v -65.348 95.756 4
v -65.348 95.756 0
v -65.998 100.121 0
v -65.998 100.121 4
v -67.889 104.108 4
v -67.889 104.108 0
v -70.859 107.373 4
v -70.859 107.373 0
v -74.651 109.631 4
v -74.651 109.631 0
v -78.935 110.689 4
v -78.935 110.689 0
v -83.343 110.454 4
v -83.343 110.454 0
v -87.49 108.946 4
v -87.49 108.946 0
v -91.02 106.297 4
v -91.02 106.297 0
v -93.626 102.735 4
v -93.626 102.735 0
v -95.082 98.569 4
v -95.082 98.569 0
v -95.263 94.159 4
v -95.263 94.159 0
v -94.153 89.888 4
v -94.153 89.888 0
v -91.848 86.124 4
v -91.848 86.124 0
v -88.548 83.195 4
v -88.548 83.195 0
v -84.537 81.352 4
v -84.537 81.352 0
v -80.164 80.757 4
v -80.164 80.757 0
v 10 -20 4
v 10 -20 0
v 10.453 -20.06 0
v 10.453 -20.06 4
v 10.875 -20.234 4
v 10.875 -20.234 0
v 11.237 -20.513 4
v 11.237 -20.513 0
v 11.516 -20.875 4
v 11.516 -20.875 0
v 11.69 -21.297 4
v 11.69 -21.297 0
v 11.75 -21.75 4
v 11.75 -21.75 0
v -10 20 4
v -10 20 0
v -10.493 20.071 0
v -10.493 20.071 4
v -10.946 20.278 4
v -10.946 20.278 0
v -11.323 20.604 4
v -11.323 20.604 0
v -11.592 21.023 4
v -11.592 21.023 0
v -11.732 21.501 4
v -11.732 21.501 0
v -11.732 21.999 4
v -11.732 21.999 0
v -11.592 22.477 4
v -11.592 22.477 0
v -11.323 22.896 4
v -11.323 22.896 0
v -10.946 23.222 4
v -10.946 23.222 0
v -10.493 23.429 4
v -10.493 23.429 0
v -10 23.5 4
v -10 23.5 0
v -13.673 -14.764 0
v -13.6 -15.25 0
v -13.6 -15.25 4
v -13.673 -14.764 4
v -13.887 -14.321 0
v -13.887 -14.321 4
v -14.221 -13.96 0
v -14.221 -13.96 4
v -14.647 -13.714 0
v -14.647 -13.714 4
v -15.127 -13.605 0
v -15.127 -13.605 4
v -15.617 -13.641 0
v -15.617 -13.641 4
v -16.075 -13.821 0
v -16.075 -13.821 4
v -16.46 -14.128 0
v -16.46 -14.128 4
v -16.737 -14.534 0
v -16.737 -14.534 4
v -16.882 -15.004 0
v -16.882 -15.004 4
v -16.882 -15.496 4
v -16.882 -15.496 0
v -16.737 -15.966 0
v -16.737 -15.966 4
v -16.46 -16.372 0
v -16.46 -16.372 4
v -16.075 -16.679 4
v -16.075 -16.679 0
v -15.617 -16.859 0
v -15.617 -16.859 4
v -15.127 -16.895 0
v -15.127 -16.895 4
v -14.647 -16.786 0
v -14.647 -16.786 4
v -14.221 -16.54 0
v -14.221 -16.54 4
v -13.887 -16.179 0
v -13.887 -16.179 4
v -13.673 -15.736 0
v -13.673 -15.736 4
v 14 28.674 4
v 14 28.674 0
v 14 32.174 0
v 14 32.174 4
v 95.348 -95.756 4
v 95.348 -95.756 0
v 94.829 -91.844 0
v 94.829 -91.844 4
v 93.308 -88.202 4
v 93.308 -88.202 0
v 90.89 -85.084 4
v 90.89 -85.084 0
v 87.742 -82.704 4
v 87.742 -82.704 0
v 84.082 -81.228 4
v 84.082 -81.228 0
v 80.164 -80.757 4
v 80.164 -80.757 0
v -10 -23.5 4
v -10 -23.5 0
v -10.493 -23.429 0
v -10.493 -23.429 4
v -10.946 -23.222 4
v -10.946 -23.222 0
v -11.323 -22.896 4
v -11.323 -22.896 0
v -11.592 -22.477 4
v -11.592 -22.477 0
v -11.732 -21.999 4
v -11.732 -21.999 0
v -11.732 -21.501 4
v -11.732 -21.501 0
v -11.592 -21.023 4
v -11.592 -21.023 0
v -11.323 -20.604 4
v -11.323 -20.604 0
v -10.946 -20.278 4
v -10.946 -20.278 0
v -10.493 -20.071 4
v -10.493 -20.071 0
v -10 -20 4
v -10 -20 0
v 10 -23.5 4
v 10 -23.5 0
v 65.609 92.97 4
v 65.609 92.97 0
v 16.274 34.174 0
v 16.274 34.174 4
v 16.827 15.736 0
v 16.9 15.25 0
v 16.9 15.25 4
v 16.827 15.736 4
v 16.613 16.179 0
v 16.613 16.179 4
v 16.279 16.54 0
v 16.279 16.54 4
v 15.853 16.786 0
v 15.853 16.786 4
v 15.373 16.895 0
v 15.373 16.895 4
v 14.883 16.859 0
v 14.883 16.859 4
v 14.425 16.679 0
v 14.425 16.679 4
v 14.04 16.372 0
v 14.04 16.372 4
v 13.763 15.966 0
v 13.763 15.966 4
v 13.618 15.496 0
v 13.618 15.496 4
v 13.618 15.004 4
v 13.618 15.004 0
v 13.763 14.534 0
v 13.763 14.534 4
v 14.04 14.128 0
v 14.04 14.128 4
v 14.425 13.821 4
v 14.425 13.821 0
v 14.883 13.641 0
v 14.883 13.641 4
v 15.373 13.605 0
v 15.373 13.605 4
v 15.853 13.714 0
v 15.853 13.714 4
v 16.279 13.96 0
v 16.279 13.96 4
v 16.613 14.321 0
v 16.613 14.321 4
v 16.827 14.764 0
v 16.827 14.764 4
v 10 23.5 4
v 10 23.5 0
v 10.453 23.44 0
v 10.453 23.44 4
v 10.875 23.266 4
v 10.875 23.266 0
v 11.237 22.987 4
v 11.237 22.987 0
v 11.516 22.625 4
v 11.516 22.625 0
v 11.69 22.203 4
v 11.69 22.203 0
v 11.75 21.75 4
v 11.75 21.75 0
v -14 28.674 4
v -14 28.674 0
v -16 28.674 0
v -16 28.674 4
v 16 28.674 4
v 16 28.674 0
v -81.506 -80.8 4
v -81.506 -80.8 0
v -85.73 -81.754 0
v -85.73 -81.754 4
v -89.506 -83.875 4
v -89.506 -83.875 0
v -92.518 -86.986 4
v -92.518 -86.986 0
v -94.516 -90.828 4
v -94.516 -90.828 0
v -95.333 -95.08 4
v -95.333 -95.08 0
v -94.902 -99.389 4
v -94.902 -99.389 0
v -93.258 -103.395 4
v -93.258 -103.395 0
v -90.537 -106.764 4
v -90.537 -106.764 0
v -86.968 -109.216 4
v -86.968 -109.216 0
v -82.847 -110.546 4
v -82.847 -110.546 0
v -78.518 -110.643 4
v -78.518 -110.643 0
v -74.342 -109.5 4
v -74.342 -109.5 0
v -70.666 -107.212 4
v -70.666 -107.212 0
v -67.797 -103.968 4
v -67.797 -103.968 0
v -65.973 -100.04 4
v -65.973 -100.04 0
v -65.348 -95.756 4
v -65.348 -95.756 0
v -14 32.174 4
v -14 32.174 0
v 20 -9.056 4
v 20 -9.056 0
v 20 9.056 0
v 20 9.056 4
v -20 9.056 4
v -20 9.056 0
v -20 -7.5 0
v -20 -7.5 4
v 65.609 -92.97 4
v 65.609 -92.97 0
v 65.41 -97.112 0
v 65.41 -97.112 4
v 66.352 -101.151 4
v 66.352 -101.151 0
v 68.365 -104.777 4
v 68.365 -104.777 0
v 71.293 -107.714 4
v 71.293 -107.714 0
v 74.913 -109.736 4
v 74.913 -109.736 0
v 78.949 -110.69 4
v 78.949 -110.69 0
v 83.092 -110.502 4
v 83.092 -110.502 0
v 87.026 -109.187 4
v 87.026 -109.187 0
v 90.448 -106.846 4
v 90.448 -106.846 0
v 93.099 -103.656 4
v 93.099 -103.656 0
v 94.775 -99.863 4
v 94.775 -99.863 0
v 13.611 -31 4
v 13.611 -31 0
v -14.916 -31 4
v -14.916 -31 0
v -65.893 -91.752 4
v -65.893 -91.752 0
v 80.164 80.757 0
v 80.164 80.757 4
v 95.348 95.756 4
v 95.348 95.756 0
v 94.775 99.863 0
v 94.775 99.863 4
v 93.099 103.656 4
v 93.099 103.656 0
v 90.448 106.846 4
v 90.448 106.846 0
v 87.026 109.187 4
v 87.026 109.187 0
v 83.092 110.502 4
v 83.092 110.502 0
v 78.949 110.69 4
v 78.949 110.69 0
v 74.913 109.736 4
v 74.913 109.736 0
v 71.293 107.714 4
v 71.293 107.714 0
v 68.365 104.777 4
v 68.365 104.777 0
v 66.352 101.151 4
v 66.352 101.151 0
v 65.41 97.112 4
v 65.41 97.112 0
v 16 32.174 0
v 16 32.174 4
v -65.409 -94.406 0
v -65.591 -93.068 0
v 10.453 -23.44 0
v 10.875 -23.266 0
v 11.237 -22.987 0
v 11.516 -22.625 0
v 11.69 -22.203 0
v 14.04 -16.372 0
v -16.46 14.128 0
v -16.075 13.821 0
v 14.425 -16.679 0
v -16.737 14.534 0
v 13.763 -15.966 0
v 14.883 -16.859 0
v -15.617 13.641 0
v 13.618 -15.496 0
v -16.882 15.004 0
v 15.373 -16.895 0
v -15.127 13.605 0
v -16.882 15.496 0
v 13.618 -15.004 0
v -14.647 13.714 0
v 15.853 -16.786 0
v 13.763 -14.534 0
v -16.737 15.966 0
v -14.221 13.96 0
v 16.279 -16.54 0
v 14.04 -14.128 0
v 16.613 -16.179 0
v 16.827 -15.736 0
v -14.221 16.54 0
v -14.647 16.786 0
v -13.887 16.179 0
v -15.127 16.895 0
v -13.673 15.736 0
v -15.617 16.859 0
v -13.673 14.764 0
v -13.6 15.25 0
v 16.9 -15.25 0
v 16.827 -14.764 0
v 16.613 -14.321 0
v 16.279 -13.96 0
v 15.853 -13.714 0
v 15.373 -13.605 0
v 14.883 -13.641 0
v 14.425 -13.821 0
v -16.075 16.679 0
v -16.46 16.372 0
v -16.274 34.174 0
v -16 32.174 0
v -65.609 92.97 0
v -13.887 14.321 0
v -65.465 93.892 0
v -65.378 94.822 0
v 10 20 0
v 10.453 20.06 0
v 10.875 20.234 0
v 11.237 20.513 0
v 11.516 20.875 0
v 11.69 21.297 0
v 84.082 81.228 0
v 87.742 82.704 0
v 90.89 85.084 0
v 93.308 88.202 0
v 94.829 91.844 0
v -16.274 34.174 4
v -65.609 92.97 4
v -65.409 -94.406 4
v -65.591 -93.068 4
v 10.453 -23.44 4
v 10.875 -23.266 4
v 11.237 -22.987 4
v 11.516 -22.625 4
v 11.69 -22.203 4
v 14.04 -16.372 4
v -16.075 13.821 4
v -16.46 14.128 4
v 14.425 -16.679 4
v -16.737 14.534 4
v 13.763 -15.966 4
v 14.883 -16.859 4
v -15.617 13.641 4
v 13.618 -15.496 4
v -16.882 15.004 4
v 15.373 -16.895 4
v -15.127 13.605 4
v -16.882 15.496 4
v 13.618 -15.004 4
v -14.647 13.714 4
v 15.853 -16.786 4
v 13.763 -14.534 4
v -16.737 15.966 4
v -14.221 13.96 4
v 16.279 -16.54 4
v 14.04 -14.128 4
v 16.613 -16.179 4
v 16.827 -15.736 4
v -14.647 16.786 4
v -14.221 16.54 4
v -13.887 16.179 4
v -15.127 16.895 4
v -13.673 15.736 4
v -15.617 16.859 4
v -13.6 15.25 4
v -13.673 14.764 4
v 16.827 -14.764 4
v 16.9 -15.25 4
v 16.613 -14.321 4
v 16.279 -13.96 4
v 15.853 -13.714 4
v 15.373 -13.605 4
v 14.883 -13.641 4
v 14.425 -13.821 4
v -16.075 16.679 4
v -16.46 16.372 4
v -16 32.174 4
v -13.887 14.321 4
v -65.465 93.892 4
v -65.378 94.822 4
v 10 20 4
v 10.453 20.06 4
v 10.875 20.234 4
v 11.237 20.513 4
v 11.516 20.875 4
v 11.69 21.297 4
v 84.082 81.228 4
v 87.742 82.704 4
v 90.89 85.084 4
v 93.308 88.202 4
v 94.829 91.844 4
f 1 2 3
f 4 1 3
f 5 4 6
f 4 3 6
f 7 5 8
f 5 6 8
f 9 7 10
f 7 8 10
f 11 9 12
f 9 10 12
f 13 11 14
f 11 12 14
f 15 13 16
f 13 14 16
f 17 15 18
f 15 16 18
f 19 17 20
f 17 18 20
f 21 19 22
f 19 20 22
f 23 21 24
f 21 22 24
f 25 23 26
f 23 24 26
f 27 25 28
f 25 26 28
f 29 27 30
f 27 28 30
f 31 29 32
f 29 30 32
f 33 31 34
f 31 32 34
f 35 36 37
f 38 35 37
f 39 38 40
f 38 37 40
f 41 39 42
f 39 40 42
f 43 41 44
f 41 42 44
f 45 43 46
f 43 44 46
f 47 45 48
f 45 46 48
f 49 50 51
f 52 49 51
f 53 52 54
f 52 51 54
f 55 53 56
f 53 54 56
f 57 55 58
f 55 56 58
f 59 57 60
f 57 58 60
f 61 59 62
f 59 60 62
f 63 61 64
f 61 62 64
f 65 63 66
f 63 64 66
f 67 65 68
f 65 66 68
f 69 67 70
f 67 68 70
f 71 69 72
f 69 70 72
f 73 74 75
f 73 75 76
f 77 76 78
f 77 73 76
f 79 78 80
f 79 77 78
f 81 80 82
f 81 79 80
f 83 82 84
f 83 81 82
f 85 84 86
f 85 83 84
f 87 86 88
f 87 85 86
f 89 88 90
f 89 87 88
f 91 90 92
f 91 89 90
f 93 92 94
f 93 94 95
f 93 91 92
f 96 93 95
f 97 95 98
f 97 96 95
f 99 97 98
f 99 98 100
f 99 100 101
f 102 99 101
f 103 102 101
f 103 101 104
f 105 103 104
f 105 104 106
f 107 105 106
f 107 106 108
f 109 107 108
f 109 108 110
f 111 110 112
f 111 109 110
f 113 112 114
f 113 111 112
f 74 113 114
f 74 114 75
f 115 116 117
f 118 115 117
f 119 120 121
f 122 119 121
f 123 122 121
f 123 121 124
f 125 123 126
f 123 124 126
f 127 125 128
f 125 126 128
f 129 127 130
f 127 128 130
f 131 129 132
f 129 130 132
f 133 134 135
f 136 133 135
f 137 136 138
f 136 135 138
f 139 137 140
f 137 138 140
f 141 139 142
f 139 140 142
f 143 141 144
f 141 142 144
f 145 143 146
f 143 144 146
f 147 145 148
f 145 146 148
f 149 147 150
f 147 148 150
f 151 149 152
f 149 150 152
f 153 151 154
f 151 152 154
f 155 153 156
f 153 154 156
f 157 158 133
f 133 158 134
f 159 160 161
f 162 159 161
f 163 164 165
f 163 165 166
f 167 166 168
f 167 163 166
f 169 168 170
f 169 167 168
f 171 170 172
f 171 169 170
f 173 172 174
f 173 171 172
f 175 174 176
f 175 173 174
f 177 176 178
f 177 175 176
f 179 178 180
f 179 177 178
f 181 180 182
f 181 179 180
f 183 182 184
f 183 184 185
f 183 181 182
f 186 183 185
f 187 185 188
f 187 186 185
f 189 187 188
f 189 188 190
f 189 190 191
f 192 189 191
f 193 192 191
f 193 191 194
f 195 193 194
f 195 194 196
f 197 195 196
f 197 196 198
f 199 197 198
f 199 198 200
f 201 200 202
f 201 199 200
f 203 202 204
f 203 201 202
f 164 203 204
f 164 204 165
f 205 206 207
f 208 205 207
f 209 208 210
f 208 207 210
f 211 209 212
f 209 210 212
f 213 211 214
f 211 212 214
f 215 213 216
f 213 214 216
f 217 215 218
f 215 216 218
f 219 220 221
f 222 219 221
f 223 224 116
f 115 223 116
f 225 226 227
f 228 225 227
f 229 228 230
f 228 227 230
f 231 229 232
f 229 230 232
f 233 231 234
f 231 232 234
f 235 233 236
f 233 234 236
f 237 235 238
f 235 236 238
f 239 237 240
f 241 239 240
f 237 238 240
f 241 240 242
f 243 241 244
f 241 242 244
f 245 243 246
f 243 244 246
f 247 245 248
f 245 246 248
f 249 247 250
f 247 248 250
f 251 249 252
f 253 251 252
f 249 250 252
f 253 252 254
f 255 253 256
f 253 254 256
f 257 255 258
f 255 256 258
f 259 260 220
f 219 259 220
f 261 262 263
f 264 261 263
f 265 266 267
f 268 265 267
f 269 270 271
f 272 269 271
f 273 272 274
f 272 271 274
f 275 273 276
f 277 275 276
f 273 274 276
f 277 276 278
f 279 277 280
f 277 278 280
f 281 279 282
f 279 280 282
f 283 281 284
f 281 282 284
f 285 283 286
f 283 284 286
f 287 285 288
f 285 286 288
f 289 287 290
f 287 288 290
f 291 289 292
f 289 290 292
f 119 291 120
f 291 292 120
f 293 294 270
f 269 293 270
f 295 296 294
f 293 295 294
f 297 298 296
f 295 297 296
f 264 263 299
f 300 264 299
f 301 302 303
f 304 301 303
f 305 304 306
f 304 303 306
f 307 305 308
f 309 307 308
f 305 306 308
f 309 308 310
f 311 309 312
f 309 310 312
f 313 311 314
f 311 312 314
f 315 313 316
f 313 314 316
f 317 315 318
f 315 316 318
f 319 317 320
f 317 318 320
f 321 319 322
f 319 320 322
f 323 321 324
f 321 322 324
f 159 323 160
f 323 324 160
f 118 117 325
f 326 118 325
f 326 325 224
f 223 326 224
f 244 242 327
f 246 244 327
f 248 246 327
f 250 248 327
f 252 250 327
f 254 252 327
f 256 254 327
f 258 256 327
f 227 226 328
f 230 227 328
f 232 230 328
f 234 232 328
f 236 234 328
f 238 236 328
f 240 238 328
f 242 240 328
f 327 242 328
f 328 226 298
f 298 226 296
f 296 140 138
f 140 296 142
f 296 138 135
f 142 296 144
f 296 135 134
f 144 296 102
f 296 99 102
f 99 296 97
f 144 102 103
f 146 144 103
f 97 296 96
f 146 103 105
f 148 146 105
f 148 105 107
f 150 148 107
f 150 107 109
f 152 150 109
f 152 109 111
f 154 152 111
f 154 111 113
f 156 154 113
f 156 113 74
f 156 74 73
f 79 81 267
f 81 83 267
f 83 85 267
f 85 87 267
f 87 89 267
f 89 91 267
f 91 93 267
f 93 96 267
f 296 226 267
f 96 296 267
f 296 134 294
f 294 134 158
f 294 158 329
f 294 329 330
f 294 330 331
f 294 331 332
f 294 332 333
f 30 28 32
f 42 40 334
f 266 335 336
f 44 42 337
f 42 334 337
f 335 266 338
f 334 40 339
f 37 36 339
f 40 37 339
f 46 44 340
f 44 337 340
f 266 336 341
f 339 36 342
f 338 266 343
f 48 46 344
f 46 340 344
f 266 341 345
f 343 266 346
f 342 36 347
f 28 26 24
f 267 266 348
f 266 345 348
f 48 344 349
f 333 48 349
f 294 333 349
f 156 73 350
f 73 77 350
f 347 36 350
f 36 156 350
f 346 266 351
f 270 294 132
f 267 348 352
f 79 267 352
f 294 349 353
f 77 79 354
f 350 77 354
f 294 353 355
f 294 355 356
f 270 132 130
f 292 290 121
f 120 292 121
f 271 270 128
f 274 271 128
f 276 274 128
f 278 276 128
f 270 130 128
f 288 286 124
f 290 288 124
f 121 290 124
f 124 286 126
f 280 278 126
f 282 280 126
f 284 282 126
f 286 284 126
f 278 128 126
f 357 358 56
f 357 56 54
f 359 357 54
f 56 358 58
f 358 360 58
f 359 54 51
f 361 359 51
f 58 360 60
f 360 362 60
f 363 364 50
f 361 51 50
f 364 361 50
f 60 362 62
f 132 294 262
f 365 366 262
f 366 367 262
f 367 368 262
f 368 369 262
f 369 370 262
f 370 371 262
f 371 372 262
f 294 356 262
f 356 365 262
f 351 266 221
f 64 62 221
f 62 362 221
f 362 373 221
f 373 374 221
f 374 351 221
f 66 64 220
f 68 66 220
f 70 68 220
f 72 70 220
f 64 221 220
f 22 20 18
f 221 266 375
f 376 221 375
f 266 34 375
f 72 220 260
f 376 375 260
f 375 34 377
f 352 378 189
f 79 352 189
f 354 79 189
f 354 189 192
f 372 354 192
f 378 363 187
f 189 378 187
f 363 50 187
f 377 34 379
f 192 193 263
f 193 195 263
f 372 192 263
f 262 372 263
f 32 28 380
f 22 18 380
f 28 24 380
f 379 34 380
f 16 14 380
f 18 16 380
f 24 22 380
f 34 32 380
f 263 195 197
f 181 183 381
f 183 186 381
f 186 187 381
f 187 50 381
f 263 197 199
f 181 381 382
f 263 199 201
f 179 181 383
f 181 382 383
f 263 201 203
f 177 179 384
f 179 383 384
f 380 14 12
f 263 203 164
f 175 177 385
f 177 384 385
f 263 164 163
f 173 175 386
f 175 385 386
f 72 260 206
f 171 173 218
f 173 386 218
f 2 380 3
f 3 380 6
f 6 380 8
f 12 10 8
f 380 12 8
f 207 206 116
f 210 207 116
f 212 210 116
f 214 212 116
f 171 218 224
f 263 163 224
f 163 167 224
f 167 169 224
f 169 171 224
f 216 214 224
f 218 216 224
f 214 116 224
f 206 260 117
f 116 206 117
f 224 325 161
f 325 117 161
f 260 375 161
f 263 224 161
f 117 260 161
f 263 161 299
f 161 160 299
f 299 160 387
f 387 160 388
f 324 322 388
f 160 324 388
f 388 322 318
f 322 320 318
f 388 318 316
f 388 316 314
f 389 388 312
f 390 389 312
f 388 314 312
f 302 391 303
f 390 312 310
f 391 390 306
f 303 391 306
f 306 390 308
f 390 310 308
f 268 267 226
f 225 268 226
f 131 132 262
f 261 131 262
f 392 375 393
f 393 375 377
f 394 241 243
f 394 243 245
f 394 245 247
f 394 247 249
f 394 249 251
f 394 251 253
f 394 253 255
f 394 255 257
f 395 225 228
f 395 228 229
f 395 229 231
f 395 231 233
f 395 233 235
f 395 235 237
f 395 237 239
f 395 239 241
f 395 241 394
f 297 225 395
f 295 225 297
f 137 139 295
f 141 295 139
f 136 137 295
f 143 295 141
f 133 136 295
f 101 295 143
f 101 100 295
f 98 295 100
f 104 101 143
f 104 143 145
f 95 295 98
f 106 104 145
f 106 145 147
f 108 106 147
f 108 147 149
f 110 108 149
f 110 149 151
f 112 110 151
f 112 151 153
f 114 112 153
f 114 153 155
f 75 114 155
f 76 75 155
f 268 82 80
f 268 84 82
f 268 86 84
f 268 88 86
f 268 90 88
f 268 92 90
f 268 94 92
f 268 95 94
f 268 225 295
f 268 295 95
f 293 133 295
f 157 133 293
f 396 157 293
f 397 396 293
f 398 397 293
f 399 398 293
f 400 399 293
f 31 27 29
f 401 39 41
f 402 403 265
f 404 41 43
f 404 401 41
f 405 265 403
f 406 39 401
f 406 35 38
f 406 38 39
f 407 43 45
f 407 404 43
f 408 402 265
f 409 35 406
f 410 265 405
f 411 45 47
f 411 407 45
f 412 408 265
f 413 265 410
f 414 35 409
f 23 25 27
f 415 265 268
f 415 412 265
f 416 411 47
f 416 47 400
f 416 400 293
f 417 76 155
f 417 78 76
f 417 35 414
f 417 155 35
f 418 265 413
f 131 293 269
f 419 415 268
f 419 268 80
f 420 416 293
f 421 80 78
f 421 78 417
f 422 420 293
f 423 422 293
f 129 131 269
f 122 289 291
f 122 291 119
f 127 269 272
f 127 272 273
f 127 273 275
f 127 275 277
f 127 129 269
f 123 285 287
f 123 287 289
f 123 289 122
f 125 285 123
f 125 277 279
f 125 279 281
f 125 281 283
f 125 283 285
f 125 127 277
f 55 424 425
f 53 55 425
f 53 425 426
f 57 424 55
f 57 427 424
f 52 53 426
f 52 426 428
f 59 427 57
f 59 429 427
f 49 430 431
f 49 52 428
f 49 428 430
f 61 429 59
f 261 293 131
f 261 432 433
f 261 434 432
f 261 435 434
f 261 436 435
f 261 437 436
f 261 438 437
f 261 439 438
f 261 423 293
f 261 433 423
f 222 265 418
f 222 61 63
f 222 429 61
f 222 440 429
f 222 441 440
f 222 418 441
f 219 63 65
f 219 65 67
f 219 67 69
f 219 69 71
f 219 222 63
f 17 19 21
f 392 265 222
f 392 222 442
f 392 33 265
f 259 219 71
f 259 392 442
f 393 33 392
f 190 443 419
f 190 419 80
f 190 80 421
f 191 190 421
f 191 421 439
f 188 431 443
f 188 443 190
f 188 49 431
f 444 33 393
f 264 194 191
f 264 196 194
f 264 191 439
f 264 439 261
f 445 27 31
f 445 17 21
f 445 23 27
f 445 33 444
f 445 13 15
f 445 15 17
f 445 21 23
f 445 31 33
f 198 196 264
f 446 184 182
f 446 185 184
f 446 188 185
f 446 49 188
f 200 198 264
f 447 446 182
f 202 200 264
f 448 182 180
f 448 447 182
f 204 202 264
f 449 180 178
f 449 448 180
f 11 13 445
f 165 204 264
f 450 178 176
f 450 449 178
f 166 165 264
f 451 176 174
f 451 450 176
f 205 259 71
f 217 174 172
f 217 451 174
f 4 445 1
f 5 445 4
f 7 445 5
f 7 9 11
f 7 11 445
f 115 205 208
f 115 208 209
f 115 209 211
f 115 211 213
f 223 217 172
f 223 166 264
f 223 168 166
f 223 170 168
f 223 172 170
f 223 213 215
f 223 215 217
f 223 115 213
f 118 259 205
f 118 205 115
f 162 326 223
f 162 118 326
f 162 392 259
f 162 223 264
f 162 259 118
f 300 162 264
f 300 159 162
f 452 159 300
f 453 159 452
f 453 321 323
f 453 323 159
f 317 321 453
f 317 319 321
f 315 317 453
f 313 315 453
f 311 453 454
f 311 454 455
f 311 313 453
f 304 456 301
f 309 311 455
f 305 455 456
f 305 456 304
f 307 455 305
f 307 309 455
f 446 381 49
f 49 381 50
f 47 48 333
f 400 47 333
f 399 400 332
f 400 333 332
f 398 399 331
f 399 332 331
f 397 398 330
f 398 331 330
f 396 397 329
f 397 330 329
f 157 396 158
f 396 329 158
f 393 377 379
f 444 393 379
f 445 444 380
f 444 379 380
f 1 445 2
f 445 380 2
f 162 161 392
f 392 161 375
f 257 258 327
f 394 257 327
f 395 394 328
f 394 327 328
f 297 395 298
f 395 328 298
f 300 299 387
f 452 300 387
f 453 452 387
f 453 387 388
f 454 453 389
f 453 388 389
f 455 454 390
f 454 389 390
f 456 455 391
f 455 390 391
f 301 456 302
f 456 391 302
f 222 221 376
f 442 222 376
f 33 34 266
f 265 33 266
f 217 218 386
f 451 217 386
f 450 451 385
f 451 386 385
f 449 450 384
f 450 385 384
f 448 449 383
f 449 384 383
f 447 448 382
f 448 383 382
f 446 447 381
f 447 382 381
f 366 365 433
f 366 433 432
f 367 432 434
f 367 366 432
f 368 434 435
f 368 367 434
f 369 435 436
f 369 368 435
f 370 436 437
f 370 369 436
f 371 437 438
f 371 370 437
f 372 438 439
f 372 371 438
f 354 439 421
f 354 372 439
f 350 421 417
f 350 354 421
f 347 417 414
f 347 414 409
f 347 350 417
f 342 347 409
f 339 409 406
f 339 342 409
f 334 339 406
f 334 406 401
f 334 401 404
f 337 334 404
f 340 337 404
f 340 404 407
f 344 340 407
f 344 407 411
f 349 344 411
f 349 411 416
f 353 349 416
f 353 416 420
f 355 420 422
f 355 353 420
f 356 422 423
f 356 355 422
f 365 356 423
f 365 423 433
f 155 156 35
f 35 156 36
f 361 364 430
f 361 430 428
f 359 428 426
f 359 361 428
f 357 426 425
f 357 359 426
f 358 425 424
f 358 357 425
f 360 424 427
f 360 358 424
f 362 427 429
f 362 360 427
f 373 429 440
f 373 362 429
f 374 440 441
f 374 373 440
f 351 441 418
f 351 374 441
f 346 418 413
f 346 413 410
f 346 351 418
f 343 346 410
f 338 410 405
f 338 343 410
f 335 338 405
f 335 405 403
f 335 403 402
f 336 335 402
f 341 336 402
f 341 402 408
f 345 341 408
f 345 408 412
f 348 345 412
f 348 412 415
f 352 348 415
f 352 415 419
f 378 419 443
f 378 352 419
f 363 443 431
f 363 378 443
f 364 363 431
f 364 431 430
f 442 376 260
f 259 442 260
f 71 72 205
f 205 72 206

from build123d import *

# Parameters (mm, degrees)
F0_R     = 1.65
F1_DEPTH = 4


with BuildPart() as f1:
    # F0 (on Top) → F1 (new body)
    with BuildSketch(Plane.XY):
        with BuildLine():
            Line((-20, 34.1743044555), (-20, 20))
            Line((-20, 20), (-20, 9.0556954967))
            Line((-20, 9.0556954967), (-20, -7.4999716698))
            Line((-20, -7.4999716698), (-20, -20))
            Line((-20, -20), (-20, -31))
            Line((-20, -31), (-14.9161266072, -31))
            Line((-14.9161266072, -31), (-8.6228793733, -23.5))
            Line((-8.6228793733, -23.5), (-10, -23.5))
            ThreePointArc((-10, -23.5), (-11.75, -21.75), (-10, -20))
            Line((-10, -20), (-5.6860306642, -20))
            Line((-5.6860306642, -20), (4.3806233749, -20))
            Line((4.3806233749, -20), (10, -20))
            ThreePointArc((10, -20), (11.2374368671, -20.5125631329), (11.75, -21.75))
            ThreePointArc((11.75, -21.75), (11.2374368671, -22.9874368671), (10, -23.5))
            Line((10, -23.5), (7.317472084, -23.5))
            Line((7.317472084, -23.5), (13.6107193178, -31))
            Line((13.6107193178, -31), (20, -31))
            Line((20, -31), (20, -20))
            Line((20, -20), (20, -9.0556954967))
            Line((20, -9.0556954967), (20, 9.0556954967))
            Line((20, 9.0556954967), (20, 20))
            Line((20, 20), (20, 34.1743044555))
            Line((20, 34.1743044555), (16.2742770157, 34.1743044555))
            Line((16.2742770157, 34.1743044555), (14.5960777534, 32.1743044555))
            Line((14.5960777534, 32.1743044555), (16, 32.1743044555))
            Line((16, 32.1743044555), (16, 28.6743044555))
            Line((16, 28.6743044555), (14, 28.6743044555))
            Line((14, 28.6743044555), (14, 31.4639266515))
            Line((14, 31.4639266515), (7.317472084, 23.5))
            Line((7.317472084, 23.5), (10, 23.5))
            ThreePointArc((10, 23.5), (11.2374368671, 22.9874368671), (11.75, 21.75))
            ThreePointArc((11.75, 21.75), (11.2374368671, 20.5125631329), (10, 20))
            Line((10, 20), (0, 20))
            Line((0, 20), (-4.3806233749, 20))
            Line((-4.3806233749, 20), (-10, 20))
            ThreePointArc((-10, 20), (-11.75, 21.75), (-10, 23.5))
            Line((-10, 23.5), (-7.317472084, 23.5))
            Line((-7.317472084, 23.5), (-14, 31.4639266515))
            Line((-14, 31.4639266515), (-14, 28.6743044555))
            Line((-14, 28.6743044555), (-16, 28.6743044555))
            Line((-16, 28.6743044555), (-16, 32.1743044555))
            Line((-16, 32.1743044555), (-14.5960777534, 32.1743044555))
            Line((-14.5960777534, 32.1743044555), (-16.2742770157, 34.1743044555))
            Line((-16.2742770157, 34.1743044555), (-20, 34.1743044555))
        make_face()
        with Locations((-15.25, -15.25)):
            Circle(F0_R, mode=Mode.SUBTRACT)
        with Locations((15.25, -15.25)):
            Circle(F0_R, mode=Mode.SUBTRACT)
        with Locations((-15.25, 15.25)):
            Circle(F0_R, mode=Mode.SUBTRACT)
        with Locations((15.25, 15.25)):
            Circle(F0_R, mode=Mode.SUBTRACT)
        with BuildLine():
            Line((-20, 9.0556954967), (-20, 20))
            Line((-20, 20), (-20, 34.1743044555))
            Line((-20, 34.1743044555), (-16.2742770157, 34.1743044555))
            Line((-16.2742770157, 34.1743044555), (-65.6094303769, 92.9696507149))
            ThreePointArc((-65.6094303769, 92.9696507149), (-70.7066370655, 84.2648887431), (-80.1642747962, 80.7566861309))
            Line((-80.1642747962, 80.7566861309), (-20, 9.0556954967))
        make_face()
        with BuildLine():
            Line((-20, -20), (-20, -7.4999716698))
            Line((-20, -7.4999716698), (-81.5062852996, -80.8003081427))
            ThreePointArc((-81.5062852996, -80.8003081427), (-71.7350386168, -83.4751187737), (-65.8927282585, -91.7515481563))
            Line((-65.8927282585, -91.7515481563), (-14.9161266072, -31))
            Line((-14.9161266072, -31), (-20, -31))
            Line((-20, -31), (-20, -20))
        make_face()
        with BuildLine():
            ThreePointArc((-65.3484512108, 95.7555553899), (-91.0199704611, 106.2968397941), (-80.1642747962, 80.7566861309))
            Line((-80.1642747962, 80.7566861309), (-87.6258734204, 89.6490730979))
            Line((-87.6258734204, 89.6490730979), (-80.3484512108, 95.7555553899))
            Line((-80.3484512108, 95.7555553899), (-73.0710290012, 101.8620376819))
            Line((-73.0710290012, 101.8620376819), (-65.6094303769, 92.9696507149))
            ThreePointArc((-65.6094303769, 92.9696507149), (-65.413838519, 94.3565043737), (-65.3484512108, 95.7555553899))
        make_face()
        with BuildLine():
            Line((-87.6258734204, 89.6490730979), (-80.1642747962, 80.7566861309))
            ThreePointArc((-80.1642747962, 80.7566861309), (-70.7066370655, 84.2648887431), (-65.6094303769, 92.9696507149))
            Line((-65.6094303769, 92.9696507149), (-73.0710290012, 101.8620376819))
            Line((-73.0710290012, 101.8620376819), (-80.3484512108, 95.7555553899))
            Line((-80.3484512108, 95.7555553899), (-87.6258734204, 89.6490730979))
        make_face()
        Polygon((16.2742770157, 34.1743044555), (-16.2742770157, 34.1743044555), (-14.5960777534, 32.1743044555), (-14, 32.1743044555), (-14, 31.4639266515), (-7.317472084, 23.5), (7.317472084, 23.5), (14, 31.4639266515), (14, 32.1743044555), (14.5960777534, 32.1743044555), align=None)
        with BuildLine():
            ThreePointArc((-65.8927282585, -91.7515481563), (-71.7350386168, -83.4751187737), (-81.5062852996, -80.8003081427))
            Line((-81.5062852996, -80.8003081427), (-88.3919178636, -89.0062854882))
            Line((-88.3919178636, -89.0062854882), (-80.3484512108, -95.7555553899))
            Line((-80.3484512108, -95.7555553899), (-73.8370734443, -101.2192500722))
            Line((-73.8370734443, -101.2192500722), (-65.8927282585, -91.7515481563))
        make_face()
        with BuildLine():
            Line((-88.3919178636, -89.0062854882), (-81.5062852996, -80.8003081427))
            ThreePointArc((-81.5062852996, -80.8003081427), (-90.5374768921, -106.7639047514), (-65.3484512108, -95.7555553899))
            ThreePointArc((-65.3484512108, -95.7555553899), (-65.485143297, -93.7351401212), (-65.8927282585, -91.7515481563))
            Line((-65.8927282585, -91.7515481563), (-73.8370734443, -101.2192500722))
            Line((-73.8370734443, -101.2192500722), (-80.3484512108, -95.7555553899))
            Line((-80.3484512108, -95.7555553899), (-88.3919178636, -89.0062854882))
        make_face()
        with BuildLine():
            Line((65.6094303769, 92.9696507149), (16.2742770157, 34.1743044555))
            Line((16.2742770157, 34.1743044555), (20, 34.1743044555))
            Line((20, 34.1743044555), (20, 20))
            Line((20, 20), (20, 9.0556954967))
            Line((20, 9.0556954967), (80.1642747962, 80.7566861309))
            ThreePointArc((80.1642747962, 80.7566861309), (70.7066370655, 84.2648887431), (65.6094303769, 92.9696507149))
        make_face()
        with BuildLine():
            ThreePointArc((95.3484512108, 95.7555553899), (78.9494001947, 110.6901680817), (65.6094303769, 92.9696507149))
            Line((65.6094303769, 92.9696507149), (73.0710290012, 101.8620376819))
            Line((73.0710290012, 101.8620376819), (80.3484512108, 95.7555553899))
            Line((80.3484512108, 95.7555553899), (87.6258734204, 89.6490730979))
            Line((87.6258734204, 89.6490730979), (80.1642747962, 80.7566861309))
            ThreePointArc((80.1642747962, 80.7566861309), (90.889735615, 85.0840361396), (95.3484512108, 95.7555553899))
        make_face()
        with BuildLine():
            Line((73.0710290012, 101.8620376819), (65.6094303769, 92.9696507149))
            ThreePointArc((65.6094303769, 92.9696507149), (70.7066370655, 84.2648887431), (80.1642747962, 80.7566861309))
            Line((80.1642747962, 80.7566861309), (87.6258734204, 89.6490730979))
            Line((87.6258734204, 89.6490730979), (80.3484512108, 95.7555553899))
            Line((80.3484512108, 95.7555553899), (73.0710290012, 101.8620376819))
        make_face()
        Polygon((-8.6228793733, -23.5), (-14.9161266072, -31), (13.6107193178, -31), (7.317472084, -23.5), align=None)
        with BuildLine():
            Line((20, -31), (13.6107193178, -31))
            Line((13.6107193178, -31), (65.6094303769, -92.9696507149))
            ThreePointArc((65.6094303769, -92.9696507149), (70.7066370655, -84.2648887431), (80.1642747962, -80.7566861309))
            Line((80.1642747962, -80.7566861309), (20, -9.0556954967))
            Line((20, -9.0556954967), (20, -20))
            Line((20, -20), (20, -31))
        make_face()
        with BuildLine():
            ThreePointArc((80.1642747962, -80.7566861309), (70.7066370655, -84.2648887431), (65.6094303769, -92.9696507149))
            Line((65.6094303769, -92.9696507149), (73.0710290012, -101.8620376819))
            Line((73.0710290012, -101.8620376819), (80.3484512108, -95.7555553899))
            Line((80.3484512108, -95.7555553899), (87.6258734204, -89.6490730979))
            Line((87.6258734204, -89.6490730979), (80.1642747962, -80.7566861309))
        make_face()
        with BuildLine():
            Line((73.0710290012, -101.8620376819), (65.6094303769, -92.9696507149))
            ThreePointArc((65.6094303769, -92.9696507149), (78.9494001947, -110.6901680817), (95.3484512108, -95.7555553899))
            ThreePointArc((95.3484512108, -95.7555553899), (90.889735615, -85.0840361396), (80.1642747962, -80.7566861309))
            Line((80.1642747962, -80.7566861309), (87.6258734204, -89.6490730979))
            Line((87.6258734204, -89.6490730979), (80.3484512108, -95.7555553899))
            Line((80.3484512108, -95.7555553899), (73.0710290012, -101.8620376819))
        make_face()
    extrude(amount=F1_DEPTH)


solid = f1.part
